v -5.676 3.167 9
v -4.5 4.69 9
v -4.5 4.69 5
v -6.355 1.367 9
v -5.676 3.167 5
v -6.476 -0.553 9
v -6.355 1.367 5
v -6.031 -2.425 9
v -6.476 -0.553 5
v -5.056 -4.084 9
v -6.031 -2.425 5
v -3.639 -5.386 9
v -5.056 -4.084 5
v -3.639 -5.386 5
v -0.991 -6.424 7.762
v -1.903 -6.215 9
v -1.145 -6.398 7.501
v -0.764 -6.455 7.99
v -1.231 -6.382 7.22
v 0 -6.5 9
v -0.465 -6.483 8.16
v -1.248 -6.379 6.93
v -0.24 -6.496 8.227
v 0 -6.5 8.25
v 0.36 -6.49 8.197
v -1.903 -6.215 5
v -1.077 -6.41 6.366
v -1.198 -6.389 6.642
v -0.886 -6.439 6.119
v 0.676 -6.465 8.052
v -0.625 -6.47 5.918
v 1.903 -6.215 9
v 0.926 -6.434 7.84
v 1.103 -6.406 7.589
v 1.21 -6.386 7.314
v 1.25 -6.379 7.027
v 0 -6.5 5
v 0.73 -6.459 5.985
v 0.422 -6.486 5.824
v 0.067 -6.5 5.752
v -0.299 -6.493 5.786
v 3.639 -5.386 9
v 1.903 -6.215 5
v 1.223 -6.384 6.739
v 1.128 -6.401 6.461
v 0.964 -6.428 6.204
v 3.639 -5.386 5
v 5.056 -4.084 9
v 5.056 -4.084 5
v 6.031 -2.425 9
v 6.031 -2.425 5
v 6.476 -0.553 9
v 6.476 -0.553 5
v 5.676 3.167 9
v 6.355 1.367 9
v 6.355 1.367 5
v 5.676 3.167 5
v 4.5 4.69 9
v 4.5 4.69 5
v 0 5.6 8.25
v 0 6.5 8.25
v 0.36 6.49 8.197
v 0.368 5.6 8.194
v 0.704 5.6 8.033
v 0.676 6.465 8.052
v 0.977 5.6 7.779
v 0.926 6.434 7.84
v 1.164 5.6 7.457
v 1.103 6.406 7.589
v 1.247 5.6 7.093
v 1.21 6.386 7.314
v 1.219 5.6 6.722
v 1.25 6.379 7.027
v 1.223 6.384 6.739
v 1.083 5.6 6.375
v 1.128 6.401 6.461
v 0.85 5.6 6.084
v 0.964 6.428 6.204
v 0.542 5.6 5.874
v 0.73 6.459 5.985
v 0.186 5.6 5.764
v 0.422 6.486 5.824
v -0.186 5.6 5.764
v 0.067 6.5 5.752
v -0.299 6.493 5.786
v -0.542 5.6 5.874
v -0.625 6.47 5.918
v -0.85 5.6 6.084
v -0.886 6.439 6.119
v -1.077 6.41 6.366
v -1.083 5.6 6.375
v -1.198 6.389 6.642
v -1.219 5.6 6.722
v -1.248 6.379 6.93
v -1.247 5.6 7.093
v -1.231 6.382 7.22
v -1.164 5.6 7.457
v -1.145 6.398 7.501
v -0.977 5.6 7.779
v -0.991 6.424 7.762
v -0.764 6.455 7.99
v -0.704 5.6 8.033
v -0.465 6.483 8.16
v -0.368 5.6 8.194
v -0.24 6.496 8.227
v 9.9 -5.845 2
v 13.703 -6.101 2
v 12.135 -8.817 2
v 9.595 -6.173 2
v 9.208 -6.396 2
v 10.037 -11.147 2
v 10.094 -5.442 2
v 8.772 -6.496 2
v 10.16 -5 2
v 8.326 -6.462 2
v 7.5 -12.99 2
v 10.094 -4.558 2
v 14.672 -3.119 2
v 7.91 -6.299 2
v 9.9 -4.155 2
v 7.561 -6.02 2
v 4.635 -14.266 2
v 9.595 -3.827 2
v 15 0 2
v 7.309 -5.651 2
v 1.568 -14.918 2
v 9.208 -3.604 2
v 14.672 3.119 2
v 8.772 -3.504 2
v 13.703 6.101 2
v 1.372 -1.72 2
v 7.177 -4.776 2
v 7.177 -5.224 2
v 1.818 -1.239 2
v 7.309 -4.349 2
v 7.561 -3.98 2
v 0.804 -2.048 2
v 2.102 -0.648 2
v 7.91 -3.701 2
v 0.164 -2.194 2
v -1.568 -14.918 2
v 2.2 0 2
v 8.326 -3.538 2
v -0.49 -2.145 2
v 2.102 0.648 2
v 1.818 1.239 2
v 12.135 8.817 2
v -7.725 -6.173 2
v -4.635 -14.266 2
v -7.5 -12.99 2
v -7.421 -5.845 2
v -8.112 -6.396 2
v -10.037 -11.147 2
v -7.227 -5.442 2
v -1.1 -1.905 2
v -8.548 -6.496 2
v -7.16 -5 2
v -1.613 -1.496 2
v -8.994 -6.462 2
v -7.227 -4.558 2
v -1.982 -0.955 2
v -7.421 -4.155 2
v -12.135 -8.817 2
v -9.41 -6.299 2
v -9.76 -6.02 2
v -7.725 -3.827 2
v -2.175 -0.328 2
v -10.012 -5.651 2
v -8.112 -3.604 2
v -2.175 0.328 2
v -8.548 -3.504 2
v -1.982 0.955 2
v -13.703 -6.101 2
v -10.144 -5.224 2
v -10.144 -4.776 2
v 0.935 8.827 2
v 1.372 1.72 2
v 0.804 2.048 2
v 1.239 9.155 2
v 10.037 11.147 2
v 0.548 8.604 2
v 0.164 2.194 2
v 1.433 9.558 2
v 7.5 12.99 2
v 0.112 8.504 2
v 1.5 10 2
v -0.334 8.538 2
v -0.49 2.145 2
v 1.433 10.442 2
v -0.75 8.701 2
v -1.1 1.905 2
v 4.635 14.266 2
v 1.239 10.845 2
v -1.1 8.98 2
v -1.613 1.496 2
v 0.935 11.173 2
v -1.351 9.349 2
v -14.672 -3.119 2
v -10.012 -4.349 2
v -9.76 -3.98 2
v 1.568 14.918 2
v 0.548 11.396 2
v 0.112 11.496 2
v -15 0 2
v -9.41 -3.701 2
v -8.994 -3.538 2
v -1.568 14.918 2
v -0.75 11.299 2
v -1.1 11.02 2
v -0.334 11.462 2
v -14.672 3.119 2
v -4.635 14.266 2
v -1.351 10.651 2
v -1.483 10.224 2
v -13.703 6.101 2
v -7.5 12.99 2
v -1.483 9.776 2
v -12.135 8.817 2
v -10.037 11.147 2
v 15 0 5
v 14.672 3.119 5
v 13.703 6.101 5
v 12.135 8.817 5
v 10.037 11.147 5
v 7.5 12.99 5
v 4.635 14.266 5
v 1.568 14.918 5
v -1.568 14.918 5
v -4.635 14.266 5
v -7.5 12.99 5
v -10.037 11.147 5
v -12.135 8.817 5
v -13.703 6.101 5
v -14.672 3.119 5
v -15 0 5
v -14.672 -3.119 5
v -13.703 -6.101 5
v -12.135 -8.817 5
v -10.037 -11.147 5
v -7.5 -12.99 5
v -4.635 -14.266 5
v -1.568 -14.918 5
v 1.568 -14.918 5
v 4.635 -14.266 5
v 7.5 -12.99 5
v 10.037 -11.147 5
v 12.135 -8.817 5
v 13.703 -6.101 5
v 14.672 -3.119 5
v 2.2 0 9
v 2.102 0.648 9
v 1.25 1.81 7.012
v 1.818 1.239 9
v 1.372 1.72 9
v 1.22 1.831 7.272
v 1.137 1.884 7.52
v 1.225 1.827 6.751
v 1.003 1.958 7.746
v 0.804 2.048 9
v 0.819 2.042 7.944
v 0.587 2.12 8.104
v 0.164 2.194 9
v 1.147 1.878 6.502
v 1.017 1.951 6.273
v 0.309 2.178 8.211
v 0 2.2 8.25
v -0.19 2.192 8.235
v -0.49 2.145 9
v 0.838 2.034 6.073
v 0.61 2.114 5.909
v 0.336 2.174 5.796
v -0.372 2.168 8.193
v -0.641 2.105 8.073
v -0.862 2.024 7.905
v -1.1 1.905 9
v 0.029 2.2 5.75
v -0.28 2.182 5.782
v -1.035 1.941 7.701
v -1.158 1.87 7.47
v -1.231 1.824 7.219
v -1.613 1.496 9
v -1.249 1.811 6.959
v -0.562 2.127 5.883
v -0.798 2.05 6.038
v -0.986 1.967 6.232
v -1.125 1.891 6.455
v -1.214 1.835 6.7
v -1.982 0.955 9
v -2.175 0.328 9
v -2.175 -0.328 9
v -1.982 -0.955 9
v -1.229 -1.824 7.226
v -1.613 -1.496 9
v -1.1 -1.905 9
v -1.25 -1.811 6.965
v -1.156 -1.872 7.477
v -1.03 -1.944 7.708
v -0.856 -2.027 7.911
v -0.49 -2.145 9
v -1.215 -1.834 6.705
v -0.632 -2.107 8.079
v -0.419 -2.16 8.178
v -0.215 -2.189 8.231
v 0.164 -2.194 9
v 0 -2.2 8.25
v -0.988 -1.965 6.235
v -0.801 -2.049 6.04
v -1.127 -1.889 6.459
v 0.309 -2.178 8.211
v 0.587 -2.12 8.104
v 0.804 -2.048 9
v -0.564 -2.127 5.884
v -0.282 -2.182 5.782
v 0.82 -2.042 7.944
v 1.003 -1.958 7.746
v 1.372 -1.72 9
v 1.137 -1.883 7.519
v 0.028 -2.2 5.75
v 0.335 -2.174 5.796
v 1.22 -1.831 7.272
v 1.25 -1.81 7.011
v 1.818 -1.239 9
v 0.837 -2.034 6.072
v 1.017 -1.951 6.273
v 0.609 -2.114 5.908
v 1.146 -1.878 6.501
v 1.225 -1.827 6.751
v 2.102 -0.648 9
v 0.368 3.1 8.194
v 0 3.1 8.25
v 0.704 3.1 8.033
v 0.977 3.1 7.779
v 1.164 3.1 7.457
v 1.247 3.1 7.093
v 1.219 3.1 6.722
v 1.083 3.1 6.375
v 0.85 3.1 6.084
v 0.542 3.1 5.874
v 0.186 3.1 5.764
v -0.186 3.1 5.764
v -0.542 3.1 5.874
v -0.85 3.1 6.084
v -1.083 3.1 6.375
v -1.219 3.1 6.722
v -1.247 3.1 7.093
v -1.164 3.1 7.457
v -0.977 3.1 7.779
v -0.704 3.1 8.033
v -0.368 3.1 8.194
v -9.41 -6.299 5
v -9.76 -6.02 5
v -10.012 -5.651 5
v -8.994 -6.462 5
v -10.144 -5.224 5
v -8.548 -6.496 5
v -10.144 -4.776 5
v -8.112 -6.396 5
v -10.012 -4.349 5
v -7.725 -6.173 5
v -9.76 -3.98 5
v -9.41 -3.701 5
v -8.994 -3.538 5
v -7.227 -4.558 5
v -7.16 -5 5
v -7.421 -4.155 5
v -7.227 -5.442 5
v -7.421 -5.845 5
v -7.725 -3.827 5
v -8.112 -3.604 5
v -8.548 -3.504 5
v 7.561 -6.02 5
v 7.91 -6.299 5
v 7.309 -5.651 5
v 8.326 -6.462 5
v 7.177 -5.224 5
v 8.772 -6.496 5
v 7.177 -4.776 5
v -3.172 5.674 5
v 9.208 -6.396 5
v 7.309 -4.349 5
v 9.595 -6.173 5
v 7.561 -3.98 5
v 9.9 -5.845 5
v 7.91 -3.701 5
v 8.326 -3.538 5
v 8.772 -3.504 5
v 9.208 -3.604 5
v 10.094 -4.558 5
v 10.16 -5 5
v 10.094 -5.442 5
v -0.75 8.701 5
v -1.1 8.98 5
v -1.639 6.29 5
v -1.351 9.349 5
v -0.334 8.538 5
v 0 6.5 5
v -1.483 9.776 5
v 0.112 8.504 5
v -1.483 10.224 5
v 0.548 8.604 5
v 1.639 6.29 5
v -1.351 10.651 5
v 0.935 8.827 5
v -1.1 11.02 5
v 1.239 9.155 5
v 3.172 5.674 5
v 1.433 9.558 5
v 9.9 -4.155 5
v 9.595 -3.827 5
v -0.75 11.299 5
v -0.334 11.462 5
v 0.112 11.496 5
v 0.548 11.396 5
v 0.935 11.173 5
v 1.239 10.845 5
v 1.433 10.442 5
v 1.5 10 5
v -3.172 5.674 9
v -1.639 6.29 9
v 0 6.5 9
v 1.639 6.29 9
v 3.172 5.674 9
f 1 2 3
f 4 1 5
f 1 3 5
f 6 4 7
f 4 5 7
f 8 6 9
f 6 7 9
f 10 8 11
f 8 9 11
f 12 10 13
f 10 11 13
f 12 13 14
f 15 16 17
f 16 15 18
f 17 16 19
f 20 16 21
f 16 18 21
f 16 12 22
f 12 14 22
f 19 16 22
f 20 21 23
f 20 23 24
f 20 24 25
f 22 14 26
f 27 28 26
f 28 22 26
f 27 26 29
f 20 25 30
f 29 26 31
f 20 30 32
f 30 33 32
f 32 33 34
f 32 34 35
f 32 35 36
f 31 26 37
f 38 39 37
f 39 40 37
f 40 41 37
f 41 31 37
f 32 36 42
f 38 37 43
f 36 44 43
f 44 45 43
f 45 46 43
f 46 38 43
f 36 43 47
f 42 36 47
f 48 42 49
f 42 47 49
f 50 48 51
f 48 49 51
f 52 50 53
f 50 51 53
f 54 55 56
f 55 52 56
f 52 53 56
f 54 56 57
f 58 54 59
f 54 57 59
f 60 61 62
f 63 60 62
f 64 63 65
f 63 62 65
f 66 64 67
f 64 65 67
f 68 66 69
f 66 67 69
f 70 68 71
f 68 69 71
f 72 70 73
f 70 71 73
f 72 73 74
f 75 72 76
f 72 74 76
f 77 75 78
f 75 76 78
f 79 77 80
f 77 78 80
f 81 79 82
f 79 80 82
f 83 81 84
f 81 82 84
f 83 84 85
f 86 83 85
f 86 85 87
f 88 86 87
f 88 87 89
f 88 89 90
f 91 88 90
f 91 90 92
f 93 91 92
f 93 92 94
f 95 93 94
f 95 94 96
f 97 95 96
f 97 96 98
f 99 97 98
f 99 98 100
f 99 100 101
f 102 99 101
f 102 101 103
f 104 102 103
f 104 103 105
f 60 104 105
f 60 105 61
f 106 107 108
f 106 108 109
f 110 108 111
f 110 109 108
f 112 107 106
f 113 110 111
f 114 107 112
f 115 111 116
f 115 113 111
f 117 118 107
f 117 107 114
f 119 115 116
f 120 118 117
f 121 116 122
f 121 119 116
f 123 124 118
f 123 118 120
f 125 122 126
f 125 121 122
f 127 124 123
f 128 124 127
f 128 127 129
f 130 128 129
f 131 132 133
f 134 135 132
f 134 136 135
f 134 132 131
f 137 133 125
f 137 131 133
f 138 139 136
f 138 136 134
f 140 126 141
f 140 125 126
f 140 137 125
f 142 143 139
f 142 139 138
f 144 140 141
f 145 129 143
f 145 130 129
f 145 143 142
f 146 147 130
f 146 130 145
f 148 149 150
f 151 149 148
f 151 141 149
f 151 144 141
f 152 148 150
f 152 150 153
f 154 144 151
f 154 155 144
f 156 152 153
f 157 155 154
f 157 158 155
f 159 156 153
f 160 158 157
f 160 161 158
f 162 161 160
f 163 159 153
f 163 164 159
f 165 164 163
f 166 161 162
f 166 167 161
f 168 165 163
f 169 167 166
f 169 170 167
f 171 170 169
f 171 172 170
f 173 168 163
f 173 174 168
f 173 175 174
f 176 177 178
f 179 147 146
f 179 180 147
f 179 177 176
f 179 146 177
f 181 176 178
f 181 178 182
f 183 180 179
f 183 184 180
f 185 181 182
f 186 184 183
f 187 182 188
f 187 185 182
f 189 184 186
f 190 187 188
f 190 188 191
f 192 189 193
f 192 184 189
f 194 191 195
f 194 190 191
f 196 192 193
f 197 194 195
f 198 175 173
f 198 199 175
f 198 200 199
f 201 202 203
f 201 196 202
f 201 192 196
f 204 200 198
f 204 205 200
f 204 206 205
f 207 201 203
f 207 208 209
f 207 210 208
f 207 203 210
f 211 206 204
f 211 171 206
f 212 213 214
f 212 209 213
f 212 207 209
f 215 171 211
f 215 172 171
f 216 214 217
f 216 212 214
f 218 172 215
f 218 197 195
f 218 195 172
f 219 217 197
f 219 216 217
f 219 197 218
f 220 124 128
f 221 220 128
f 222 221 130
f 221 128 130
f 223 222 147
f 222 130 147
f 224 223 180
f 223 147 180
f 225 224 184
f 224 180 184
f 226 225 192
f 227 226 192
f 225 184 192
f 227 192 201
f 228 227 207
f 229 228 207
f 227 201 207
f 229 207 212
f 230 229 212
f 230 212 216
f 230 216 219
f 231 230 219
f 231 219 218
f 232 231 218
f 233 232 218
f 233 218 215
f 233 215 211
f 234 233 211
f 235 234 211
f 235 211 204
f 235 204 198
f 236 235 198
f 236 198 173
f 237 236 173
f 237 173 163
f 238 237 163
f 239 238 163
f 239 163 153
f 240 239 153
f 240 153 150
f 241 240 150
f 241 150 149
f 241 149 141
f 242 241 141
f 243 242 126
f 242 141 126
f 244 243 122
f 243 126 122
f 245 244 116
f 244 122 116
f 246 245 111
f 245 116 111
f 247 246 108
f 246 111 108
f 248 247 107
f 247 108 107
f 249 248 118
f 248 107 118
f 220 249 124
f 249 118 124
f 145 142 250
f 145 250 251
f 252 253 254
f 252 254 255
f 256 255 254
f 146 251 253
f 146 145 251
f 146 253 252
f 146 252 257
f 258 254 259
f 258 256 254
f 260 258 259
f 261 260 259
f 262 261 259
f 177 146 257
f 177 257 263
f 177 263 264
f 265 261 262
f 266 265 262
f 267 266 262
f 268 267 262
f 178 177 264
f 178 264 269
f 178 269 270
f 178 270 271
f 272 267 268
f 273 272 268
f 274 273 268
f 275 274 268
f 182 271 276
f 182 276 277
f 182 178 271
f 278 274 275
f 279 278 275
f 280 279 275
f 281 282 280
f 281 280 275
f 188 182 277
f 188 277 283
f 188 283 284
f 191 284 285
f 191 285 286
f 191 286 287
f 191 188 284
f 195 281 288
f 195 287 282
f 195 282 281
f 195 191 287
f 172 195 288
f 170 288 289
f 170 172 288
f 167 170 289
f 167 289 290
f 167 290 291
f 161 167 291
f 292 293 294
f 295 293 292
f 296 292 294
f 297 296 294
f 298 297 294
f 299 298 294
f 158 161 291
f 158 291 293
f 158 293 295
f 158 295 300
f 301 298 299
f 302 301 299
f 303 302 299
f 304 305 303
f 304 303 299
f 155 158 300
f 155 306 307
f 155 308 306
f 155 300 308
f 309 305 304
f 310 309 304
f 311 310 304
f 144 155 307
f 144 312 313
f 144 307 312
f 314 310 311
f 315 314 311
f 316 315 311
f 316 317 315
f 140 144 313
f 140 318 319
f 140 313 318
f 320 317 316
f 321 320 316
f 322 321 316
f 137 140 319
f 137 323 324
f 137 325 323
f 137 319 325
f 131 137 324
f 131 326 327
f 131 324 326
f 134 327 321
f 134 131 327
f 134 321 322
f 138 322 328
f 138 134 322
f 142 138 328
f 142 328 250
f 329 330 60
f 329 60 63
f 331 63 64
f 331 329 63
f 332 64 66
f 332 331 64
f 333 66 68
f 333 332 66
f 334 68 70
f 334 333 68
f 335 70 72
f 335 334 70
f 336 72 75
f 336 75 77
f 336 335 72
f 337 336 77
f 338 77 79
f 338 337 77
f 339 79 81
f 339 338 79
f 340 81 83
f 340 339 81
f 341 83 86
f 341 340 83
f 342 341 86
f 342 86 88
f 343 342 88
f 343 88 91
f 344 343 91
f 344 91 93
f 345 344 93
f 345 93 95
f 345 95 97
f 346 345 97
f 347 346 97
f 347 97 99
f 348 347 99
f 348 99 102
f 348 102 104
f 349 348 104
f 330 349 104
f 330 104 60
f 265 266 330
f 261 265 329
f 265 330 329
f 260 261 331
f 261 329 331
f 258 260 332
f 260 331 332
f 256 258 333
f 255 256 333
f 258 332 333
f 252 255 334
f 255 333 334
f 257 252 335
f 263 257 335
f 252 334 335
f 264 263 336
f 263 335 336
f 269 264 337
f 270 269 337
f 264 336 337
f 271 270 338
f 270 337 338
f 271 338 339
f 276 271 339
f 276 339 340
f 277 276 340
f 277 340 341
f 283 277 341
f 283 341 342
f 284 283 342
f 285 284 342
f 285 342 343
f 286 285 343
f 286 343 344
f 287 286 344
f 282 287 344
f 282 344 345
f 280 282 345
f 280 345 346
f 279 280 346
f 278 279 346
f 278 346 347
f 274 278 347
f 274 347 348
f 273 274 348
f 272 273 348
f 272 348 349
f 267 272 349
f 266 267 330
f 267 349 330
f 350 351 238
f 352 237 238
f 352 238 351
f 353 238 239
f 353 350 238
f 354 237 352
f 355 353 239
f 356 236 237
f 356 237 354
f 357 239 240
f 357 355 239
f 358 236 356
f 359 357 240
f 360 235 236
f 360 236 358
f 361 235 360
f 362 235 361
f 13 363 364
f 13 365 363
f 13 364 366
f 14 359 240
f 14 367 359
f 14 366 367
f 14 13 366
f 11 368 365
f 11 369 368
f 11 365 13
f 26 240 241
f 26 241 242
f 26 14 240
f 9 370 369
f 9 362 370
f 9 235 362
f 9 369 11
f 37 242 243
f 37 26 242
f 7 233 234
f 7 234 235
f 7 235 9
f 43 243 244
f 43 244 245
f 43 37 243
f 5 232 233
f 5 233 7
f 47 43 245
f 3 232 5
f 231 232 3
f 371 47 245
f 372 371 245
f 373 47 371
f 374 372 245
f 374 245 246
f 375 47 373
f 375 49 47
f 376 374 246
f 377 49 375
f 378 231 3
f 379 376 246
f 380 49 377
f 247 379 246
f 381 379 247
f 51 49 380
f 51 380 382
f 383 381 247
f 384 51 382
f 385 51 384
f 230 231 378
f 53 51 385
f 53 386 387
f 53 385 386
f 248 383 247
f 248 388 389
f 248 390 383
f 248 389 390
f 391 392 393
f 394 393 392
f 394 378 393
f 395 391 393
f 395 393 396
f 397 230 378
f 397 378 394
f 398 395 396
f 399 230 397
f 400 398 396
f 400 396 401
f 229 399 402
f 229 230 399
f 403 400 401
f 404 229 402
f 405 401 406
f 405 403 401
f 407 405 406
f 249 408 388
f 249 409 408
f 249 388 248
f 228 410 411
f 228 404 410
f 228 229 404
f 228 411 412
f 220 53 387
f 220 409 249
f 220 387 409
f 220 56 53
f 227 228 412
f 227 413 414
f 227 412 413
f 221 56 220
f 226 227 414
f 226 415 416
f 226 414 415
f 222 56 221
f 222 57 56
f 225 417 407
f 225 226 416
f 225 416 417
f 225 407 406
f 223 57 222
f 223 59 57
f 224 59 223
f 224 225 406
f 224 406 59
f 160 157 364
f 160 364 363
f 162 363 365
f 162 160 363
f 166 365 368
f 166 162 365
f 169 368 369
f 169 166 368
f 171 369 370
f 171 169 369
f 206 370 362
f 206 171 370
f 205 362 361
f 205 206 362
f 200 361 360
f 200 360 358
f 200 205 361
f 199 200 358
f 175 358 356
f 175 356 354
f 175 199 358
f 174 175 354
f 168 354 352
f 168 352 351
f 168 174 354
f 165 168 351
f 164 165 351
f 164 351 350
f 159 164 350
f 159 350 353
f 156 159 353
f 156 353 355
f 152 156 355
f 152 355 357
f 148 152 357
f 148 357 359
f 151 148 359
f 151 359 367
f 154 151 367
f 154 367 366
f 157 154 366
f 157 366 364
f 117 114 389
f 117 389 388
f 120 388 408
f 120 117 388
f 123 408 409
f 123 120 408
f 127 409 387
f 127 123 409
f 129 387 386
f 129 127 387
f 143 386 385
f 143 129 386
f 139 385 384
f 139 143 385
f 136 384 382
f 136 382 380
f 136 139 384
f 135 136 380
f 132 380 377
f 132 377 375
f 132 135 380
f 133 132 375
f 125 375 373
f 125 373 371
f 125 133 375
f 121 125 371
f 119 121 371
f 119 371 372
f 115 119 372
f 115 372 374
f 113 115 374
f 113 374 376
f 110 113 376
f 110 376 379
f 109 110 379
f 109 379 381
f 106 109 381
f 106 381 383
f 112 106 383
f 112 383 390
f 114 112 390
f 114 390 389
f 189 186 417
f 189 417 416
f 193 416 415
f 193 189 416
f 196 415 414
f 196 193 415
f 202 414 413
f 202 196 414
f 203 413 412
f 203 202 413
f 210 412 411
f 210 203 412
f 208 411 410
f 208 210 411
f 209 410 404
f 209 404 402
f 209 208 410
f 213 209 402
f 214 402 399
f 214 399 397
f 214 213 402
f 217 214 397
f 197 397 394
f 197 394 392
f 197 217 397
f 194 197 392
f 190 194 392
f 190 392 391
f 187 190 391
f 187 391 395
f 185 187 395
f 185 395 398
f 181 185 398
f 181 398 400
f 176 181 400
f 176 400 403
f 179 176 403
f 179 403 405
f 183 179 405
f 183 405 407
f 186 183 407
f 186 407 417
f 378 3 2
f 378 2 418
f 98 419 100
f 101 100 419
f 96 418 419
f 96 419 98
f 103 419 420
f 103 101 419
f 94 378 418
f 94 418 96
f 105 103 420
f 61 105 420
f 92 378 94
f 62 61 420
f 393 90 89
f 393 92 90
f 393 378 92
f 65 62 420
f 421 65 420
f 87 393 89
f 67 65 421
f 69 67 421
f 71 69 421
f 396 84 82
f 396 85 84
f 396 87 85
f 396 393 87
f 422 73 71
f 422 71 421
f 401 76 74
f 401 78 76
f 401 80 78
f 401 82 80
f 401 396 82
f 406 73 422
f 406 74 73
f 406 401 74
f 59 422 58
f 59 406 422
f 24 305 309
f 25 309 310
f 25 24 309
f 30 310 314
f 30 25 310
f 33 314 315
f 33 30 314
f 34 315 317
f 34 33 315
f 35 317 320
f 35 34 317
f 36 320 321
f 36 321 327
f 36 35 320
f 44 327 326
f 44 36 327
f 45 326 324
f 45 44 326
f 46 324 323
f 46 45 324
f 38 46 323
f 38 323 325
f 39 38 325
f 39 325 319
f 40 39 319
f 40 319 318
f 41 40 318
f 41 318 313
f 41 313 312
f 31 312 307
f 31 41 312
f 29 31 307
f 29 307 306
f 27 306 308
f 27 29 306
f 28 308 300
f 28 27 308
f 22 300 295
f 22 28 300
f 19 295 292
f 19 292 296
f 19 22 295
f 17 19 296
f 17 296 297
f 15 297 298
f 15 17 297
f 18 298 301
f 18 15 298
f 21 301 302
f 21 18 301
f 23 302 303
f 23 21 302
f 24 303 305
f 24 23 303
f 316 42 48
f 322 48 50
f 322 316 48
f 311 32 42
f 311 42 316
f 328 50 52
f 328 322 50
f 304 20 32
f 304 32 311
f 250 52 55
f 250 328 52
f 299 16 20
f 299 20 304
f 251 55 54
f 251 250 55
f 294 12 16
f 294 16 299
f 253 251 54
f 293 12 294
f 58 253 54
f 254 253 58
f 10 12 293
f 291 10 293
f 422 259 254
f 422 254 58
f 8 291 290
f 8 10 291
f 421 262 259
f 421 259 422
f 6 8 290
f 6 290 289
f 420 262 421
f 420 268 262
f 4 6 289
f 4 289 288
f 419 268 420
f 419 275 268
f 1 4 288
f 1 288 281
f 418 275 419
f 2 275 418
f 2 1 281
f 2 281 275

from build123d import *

# Parameters (mm, degrees)
SKETCH1_R               = 15
SKETCH1_R_2             = 2.2
SKETCH1_R_3             = 1.5
BOSS_EXTRUDE1_DEPTH     = 5
SKETCH2_R               = 6.5
SKETCH2_R_2             = 2.2
BOSS_EXTRUDE2_DEPTH     = 4
BOSS_EXTRUDE3_DEPTH     = 4
SKETCH3_W               = 6
SKETCH3_H               = 2.5
CUT_EXTRUDE1_DEPTH      = 24.043437244
SKETCH5_R               = 1.25
CUT_EXTRUDE2_DEPTH      = 7
SKETCH6_W               = 9
SKETCH6_H               = 2.5
BOSS_EXTRUDE4_DEPTH     = 6
CUT_EXTRUDE3_START      = -4
CUT_EXTRUDE3_DEPTH      = 4
CUT_EXTRUDE4_DEPTH      = 2
CUT_EXTRUDE4_DEPTH_BACK = 14
SKETCH8_R               = 1.25
SKETCH9_R               = 15
CUT_EXTRUDE5_DEPTH      = 2


with BuildPart() as part:
    # Sketch1 → Boss-Extrude1 (new body)
    with BuildSketch(Plane.XY):
        Circle(SKETCH1_R)
        Circle(SKETCH1_R_2, mode=Mode.SUBTRACT)
        with Locations((0, 10)):
            Circle(SKETCH1_R_3, mode=Mode.SUBTRACT)
        with Locations((8.660254038, -5)):
            Circle(SKETCH1_R_3, mode=Mode.SUBTRACT)
        with Locations((-8.660254038, -5)):
            Circle(SKETCH1_R_3, mode=Mode.SUBTRACT)
    extrude(amount=BOSS_EXTRUDE1_DEPTH)

    # Sketch2 → Boss-Extrude2 (add)
    with BuildSketch(Plane.XY.offset(5)):
        Circle(SKETCH2_R)
        Circle(SKETCH2_R_2, mode=Mode.SUBTRACT)
    extrude(amount=BOSS_EXTRUDE2_DEPTH)

    # Sketch4 → Boss-Extrude3 (add)
    with BuildSketch(Plane.XY.offset(5)):
        with BuildLine():
            Line((-4.5, 7.69041576), (-4.5, 4.69041576))
            ThreePointArc((-4.5, 4.69041576), (0, 6.5), (4.5, 4.69041576))
            Line((4.5, 4.69041576), (4.5, 7.69041576))
            Line((4.5, 7.69041576), (-4.5, 7.69041576))
        make_face()
    extrude(amount=BOSS_EXTRUDE3_DEPTH)

    # Sketch3 → Cut-Extrude1 (cut, through all)
    with BuildSketch(Plane.XY.offset(9)):
        with Locations((0, 4.35)):
            Rectangle(SKETCH3_W, SKETCH3_H)
    extrude(amount=-CUT_EXTRUDE1_DEPTH, mode=Mode.SUBTRACT)

    # Sketch5 → Cut-Extrude2 (cut)
    with BuildSketch(Plane(origin=(0, 7.69041576, 0), x_dir=(1, 0, 0), z_dir=(0, 1, 0))):
        with Locations(Location((0, -7, 0), (0, 0, 270))):
            Circle(SKETCH5_R)
    extrude(amount=-CUT_EXTRUDE2_DEPTH, mode=Mode.SUBTRACT)

    # Sketch6 → Boss-Extrude4 (add)
    with BuildSketch(Plane(origin=(-3, 0, 0), x_dir=(0, 0, -1), z_dir=(1, 0, 0))):
        with Locations((-4.5, 4.35)):
            Rectangle(SKETCH6_W, SKETCH6_H)
    extrude(amount=BOSS_EXTRUDE4_DEPTH)

    # Sketch7 → Cut-Extrude3 (cut)
    with BuildSketch(Plane.XY.offset(9).offset(CUT_EXTRUDE3_START)):
        with BuildLine():
            ThreePointArc((-4.5, 4.69041576), (0, 6.5), (4.5, 4.69041576))
            Line((4.5, 4.69041576), (4.5, 7.69041576))
            Line((4.5, 7.69041576), (-4.5, 7.69041576))
            Line((-4.5, 7.69041576), (-4.5, 4.69041576))
        make_face()
    extrude(amount=CUT_EXTRUDE3_DEPTH, mode=Mode.SUBTRACT)

    # Sketch8 → Cut-Extrude4 (cut, two sides: drawn at the far end of the back side and taken through both)
    with BuildSketch(Plane(origin=(0, 5.6, 0), x_dir=(1, 0, 0), z_dir=(0, 1, 0)).offset(-CUT_EXTRUDE4_DEPTH_BACK)):
        with Locations(Location((0, -7, 0), (0, 0, 270))):
            Circle(SKETCH8_R)
    extrude(amount=CUT_EXTRUDE4_DEPTH + CUT_EXTRUDE4_DEPTH_BACK, mode=Mode.SUBTRACT)

    # Sketch9 → Cut-Extrude5 (cut)
    with BuildSketch(Plane(origin=(0, 0, 0), x_dir=(-1, 0, 0), z_dir=(0, 0, -1))):
        Circle(SKETCH9_R)
    extrude(amount=-CUT_EXTRUDE5_DEPTH, mode=Mode.SUBTRACT)


solid = part.part
